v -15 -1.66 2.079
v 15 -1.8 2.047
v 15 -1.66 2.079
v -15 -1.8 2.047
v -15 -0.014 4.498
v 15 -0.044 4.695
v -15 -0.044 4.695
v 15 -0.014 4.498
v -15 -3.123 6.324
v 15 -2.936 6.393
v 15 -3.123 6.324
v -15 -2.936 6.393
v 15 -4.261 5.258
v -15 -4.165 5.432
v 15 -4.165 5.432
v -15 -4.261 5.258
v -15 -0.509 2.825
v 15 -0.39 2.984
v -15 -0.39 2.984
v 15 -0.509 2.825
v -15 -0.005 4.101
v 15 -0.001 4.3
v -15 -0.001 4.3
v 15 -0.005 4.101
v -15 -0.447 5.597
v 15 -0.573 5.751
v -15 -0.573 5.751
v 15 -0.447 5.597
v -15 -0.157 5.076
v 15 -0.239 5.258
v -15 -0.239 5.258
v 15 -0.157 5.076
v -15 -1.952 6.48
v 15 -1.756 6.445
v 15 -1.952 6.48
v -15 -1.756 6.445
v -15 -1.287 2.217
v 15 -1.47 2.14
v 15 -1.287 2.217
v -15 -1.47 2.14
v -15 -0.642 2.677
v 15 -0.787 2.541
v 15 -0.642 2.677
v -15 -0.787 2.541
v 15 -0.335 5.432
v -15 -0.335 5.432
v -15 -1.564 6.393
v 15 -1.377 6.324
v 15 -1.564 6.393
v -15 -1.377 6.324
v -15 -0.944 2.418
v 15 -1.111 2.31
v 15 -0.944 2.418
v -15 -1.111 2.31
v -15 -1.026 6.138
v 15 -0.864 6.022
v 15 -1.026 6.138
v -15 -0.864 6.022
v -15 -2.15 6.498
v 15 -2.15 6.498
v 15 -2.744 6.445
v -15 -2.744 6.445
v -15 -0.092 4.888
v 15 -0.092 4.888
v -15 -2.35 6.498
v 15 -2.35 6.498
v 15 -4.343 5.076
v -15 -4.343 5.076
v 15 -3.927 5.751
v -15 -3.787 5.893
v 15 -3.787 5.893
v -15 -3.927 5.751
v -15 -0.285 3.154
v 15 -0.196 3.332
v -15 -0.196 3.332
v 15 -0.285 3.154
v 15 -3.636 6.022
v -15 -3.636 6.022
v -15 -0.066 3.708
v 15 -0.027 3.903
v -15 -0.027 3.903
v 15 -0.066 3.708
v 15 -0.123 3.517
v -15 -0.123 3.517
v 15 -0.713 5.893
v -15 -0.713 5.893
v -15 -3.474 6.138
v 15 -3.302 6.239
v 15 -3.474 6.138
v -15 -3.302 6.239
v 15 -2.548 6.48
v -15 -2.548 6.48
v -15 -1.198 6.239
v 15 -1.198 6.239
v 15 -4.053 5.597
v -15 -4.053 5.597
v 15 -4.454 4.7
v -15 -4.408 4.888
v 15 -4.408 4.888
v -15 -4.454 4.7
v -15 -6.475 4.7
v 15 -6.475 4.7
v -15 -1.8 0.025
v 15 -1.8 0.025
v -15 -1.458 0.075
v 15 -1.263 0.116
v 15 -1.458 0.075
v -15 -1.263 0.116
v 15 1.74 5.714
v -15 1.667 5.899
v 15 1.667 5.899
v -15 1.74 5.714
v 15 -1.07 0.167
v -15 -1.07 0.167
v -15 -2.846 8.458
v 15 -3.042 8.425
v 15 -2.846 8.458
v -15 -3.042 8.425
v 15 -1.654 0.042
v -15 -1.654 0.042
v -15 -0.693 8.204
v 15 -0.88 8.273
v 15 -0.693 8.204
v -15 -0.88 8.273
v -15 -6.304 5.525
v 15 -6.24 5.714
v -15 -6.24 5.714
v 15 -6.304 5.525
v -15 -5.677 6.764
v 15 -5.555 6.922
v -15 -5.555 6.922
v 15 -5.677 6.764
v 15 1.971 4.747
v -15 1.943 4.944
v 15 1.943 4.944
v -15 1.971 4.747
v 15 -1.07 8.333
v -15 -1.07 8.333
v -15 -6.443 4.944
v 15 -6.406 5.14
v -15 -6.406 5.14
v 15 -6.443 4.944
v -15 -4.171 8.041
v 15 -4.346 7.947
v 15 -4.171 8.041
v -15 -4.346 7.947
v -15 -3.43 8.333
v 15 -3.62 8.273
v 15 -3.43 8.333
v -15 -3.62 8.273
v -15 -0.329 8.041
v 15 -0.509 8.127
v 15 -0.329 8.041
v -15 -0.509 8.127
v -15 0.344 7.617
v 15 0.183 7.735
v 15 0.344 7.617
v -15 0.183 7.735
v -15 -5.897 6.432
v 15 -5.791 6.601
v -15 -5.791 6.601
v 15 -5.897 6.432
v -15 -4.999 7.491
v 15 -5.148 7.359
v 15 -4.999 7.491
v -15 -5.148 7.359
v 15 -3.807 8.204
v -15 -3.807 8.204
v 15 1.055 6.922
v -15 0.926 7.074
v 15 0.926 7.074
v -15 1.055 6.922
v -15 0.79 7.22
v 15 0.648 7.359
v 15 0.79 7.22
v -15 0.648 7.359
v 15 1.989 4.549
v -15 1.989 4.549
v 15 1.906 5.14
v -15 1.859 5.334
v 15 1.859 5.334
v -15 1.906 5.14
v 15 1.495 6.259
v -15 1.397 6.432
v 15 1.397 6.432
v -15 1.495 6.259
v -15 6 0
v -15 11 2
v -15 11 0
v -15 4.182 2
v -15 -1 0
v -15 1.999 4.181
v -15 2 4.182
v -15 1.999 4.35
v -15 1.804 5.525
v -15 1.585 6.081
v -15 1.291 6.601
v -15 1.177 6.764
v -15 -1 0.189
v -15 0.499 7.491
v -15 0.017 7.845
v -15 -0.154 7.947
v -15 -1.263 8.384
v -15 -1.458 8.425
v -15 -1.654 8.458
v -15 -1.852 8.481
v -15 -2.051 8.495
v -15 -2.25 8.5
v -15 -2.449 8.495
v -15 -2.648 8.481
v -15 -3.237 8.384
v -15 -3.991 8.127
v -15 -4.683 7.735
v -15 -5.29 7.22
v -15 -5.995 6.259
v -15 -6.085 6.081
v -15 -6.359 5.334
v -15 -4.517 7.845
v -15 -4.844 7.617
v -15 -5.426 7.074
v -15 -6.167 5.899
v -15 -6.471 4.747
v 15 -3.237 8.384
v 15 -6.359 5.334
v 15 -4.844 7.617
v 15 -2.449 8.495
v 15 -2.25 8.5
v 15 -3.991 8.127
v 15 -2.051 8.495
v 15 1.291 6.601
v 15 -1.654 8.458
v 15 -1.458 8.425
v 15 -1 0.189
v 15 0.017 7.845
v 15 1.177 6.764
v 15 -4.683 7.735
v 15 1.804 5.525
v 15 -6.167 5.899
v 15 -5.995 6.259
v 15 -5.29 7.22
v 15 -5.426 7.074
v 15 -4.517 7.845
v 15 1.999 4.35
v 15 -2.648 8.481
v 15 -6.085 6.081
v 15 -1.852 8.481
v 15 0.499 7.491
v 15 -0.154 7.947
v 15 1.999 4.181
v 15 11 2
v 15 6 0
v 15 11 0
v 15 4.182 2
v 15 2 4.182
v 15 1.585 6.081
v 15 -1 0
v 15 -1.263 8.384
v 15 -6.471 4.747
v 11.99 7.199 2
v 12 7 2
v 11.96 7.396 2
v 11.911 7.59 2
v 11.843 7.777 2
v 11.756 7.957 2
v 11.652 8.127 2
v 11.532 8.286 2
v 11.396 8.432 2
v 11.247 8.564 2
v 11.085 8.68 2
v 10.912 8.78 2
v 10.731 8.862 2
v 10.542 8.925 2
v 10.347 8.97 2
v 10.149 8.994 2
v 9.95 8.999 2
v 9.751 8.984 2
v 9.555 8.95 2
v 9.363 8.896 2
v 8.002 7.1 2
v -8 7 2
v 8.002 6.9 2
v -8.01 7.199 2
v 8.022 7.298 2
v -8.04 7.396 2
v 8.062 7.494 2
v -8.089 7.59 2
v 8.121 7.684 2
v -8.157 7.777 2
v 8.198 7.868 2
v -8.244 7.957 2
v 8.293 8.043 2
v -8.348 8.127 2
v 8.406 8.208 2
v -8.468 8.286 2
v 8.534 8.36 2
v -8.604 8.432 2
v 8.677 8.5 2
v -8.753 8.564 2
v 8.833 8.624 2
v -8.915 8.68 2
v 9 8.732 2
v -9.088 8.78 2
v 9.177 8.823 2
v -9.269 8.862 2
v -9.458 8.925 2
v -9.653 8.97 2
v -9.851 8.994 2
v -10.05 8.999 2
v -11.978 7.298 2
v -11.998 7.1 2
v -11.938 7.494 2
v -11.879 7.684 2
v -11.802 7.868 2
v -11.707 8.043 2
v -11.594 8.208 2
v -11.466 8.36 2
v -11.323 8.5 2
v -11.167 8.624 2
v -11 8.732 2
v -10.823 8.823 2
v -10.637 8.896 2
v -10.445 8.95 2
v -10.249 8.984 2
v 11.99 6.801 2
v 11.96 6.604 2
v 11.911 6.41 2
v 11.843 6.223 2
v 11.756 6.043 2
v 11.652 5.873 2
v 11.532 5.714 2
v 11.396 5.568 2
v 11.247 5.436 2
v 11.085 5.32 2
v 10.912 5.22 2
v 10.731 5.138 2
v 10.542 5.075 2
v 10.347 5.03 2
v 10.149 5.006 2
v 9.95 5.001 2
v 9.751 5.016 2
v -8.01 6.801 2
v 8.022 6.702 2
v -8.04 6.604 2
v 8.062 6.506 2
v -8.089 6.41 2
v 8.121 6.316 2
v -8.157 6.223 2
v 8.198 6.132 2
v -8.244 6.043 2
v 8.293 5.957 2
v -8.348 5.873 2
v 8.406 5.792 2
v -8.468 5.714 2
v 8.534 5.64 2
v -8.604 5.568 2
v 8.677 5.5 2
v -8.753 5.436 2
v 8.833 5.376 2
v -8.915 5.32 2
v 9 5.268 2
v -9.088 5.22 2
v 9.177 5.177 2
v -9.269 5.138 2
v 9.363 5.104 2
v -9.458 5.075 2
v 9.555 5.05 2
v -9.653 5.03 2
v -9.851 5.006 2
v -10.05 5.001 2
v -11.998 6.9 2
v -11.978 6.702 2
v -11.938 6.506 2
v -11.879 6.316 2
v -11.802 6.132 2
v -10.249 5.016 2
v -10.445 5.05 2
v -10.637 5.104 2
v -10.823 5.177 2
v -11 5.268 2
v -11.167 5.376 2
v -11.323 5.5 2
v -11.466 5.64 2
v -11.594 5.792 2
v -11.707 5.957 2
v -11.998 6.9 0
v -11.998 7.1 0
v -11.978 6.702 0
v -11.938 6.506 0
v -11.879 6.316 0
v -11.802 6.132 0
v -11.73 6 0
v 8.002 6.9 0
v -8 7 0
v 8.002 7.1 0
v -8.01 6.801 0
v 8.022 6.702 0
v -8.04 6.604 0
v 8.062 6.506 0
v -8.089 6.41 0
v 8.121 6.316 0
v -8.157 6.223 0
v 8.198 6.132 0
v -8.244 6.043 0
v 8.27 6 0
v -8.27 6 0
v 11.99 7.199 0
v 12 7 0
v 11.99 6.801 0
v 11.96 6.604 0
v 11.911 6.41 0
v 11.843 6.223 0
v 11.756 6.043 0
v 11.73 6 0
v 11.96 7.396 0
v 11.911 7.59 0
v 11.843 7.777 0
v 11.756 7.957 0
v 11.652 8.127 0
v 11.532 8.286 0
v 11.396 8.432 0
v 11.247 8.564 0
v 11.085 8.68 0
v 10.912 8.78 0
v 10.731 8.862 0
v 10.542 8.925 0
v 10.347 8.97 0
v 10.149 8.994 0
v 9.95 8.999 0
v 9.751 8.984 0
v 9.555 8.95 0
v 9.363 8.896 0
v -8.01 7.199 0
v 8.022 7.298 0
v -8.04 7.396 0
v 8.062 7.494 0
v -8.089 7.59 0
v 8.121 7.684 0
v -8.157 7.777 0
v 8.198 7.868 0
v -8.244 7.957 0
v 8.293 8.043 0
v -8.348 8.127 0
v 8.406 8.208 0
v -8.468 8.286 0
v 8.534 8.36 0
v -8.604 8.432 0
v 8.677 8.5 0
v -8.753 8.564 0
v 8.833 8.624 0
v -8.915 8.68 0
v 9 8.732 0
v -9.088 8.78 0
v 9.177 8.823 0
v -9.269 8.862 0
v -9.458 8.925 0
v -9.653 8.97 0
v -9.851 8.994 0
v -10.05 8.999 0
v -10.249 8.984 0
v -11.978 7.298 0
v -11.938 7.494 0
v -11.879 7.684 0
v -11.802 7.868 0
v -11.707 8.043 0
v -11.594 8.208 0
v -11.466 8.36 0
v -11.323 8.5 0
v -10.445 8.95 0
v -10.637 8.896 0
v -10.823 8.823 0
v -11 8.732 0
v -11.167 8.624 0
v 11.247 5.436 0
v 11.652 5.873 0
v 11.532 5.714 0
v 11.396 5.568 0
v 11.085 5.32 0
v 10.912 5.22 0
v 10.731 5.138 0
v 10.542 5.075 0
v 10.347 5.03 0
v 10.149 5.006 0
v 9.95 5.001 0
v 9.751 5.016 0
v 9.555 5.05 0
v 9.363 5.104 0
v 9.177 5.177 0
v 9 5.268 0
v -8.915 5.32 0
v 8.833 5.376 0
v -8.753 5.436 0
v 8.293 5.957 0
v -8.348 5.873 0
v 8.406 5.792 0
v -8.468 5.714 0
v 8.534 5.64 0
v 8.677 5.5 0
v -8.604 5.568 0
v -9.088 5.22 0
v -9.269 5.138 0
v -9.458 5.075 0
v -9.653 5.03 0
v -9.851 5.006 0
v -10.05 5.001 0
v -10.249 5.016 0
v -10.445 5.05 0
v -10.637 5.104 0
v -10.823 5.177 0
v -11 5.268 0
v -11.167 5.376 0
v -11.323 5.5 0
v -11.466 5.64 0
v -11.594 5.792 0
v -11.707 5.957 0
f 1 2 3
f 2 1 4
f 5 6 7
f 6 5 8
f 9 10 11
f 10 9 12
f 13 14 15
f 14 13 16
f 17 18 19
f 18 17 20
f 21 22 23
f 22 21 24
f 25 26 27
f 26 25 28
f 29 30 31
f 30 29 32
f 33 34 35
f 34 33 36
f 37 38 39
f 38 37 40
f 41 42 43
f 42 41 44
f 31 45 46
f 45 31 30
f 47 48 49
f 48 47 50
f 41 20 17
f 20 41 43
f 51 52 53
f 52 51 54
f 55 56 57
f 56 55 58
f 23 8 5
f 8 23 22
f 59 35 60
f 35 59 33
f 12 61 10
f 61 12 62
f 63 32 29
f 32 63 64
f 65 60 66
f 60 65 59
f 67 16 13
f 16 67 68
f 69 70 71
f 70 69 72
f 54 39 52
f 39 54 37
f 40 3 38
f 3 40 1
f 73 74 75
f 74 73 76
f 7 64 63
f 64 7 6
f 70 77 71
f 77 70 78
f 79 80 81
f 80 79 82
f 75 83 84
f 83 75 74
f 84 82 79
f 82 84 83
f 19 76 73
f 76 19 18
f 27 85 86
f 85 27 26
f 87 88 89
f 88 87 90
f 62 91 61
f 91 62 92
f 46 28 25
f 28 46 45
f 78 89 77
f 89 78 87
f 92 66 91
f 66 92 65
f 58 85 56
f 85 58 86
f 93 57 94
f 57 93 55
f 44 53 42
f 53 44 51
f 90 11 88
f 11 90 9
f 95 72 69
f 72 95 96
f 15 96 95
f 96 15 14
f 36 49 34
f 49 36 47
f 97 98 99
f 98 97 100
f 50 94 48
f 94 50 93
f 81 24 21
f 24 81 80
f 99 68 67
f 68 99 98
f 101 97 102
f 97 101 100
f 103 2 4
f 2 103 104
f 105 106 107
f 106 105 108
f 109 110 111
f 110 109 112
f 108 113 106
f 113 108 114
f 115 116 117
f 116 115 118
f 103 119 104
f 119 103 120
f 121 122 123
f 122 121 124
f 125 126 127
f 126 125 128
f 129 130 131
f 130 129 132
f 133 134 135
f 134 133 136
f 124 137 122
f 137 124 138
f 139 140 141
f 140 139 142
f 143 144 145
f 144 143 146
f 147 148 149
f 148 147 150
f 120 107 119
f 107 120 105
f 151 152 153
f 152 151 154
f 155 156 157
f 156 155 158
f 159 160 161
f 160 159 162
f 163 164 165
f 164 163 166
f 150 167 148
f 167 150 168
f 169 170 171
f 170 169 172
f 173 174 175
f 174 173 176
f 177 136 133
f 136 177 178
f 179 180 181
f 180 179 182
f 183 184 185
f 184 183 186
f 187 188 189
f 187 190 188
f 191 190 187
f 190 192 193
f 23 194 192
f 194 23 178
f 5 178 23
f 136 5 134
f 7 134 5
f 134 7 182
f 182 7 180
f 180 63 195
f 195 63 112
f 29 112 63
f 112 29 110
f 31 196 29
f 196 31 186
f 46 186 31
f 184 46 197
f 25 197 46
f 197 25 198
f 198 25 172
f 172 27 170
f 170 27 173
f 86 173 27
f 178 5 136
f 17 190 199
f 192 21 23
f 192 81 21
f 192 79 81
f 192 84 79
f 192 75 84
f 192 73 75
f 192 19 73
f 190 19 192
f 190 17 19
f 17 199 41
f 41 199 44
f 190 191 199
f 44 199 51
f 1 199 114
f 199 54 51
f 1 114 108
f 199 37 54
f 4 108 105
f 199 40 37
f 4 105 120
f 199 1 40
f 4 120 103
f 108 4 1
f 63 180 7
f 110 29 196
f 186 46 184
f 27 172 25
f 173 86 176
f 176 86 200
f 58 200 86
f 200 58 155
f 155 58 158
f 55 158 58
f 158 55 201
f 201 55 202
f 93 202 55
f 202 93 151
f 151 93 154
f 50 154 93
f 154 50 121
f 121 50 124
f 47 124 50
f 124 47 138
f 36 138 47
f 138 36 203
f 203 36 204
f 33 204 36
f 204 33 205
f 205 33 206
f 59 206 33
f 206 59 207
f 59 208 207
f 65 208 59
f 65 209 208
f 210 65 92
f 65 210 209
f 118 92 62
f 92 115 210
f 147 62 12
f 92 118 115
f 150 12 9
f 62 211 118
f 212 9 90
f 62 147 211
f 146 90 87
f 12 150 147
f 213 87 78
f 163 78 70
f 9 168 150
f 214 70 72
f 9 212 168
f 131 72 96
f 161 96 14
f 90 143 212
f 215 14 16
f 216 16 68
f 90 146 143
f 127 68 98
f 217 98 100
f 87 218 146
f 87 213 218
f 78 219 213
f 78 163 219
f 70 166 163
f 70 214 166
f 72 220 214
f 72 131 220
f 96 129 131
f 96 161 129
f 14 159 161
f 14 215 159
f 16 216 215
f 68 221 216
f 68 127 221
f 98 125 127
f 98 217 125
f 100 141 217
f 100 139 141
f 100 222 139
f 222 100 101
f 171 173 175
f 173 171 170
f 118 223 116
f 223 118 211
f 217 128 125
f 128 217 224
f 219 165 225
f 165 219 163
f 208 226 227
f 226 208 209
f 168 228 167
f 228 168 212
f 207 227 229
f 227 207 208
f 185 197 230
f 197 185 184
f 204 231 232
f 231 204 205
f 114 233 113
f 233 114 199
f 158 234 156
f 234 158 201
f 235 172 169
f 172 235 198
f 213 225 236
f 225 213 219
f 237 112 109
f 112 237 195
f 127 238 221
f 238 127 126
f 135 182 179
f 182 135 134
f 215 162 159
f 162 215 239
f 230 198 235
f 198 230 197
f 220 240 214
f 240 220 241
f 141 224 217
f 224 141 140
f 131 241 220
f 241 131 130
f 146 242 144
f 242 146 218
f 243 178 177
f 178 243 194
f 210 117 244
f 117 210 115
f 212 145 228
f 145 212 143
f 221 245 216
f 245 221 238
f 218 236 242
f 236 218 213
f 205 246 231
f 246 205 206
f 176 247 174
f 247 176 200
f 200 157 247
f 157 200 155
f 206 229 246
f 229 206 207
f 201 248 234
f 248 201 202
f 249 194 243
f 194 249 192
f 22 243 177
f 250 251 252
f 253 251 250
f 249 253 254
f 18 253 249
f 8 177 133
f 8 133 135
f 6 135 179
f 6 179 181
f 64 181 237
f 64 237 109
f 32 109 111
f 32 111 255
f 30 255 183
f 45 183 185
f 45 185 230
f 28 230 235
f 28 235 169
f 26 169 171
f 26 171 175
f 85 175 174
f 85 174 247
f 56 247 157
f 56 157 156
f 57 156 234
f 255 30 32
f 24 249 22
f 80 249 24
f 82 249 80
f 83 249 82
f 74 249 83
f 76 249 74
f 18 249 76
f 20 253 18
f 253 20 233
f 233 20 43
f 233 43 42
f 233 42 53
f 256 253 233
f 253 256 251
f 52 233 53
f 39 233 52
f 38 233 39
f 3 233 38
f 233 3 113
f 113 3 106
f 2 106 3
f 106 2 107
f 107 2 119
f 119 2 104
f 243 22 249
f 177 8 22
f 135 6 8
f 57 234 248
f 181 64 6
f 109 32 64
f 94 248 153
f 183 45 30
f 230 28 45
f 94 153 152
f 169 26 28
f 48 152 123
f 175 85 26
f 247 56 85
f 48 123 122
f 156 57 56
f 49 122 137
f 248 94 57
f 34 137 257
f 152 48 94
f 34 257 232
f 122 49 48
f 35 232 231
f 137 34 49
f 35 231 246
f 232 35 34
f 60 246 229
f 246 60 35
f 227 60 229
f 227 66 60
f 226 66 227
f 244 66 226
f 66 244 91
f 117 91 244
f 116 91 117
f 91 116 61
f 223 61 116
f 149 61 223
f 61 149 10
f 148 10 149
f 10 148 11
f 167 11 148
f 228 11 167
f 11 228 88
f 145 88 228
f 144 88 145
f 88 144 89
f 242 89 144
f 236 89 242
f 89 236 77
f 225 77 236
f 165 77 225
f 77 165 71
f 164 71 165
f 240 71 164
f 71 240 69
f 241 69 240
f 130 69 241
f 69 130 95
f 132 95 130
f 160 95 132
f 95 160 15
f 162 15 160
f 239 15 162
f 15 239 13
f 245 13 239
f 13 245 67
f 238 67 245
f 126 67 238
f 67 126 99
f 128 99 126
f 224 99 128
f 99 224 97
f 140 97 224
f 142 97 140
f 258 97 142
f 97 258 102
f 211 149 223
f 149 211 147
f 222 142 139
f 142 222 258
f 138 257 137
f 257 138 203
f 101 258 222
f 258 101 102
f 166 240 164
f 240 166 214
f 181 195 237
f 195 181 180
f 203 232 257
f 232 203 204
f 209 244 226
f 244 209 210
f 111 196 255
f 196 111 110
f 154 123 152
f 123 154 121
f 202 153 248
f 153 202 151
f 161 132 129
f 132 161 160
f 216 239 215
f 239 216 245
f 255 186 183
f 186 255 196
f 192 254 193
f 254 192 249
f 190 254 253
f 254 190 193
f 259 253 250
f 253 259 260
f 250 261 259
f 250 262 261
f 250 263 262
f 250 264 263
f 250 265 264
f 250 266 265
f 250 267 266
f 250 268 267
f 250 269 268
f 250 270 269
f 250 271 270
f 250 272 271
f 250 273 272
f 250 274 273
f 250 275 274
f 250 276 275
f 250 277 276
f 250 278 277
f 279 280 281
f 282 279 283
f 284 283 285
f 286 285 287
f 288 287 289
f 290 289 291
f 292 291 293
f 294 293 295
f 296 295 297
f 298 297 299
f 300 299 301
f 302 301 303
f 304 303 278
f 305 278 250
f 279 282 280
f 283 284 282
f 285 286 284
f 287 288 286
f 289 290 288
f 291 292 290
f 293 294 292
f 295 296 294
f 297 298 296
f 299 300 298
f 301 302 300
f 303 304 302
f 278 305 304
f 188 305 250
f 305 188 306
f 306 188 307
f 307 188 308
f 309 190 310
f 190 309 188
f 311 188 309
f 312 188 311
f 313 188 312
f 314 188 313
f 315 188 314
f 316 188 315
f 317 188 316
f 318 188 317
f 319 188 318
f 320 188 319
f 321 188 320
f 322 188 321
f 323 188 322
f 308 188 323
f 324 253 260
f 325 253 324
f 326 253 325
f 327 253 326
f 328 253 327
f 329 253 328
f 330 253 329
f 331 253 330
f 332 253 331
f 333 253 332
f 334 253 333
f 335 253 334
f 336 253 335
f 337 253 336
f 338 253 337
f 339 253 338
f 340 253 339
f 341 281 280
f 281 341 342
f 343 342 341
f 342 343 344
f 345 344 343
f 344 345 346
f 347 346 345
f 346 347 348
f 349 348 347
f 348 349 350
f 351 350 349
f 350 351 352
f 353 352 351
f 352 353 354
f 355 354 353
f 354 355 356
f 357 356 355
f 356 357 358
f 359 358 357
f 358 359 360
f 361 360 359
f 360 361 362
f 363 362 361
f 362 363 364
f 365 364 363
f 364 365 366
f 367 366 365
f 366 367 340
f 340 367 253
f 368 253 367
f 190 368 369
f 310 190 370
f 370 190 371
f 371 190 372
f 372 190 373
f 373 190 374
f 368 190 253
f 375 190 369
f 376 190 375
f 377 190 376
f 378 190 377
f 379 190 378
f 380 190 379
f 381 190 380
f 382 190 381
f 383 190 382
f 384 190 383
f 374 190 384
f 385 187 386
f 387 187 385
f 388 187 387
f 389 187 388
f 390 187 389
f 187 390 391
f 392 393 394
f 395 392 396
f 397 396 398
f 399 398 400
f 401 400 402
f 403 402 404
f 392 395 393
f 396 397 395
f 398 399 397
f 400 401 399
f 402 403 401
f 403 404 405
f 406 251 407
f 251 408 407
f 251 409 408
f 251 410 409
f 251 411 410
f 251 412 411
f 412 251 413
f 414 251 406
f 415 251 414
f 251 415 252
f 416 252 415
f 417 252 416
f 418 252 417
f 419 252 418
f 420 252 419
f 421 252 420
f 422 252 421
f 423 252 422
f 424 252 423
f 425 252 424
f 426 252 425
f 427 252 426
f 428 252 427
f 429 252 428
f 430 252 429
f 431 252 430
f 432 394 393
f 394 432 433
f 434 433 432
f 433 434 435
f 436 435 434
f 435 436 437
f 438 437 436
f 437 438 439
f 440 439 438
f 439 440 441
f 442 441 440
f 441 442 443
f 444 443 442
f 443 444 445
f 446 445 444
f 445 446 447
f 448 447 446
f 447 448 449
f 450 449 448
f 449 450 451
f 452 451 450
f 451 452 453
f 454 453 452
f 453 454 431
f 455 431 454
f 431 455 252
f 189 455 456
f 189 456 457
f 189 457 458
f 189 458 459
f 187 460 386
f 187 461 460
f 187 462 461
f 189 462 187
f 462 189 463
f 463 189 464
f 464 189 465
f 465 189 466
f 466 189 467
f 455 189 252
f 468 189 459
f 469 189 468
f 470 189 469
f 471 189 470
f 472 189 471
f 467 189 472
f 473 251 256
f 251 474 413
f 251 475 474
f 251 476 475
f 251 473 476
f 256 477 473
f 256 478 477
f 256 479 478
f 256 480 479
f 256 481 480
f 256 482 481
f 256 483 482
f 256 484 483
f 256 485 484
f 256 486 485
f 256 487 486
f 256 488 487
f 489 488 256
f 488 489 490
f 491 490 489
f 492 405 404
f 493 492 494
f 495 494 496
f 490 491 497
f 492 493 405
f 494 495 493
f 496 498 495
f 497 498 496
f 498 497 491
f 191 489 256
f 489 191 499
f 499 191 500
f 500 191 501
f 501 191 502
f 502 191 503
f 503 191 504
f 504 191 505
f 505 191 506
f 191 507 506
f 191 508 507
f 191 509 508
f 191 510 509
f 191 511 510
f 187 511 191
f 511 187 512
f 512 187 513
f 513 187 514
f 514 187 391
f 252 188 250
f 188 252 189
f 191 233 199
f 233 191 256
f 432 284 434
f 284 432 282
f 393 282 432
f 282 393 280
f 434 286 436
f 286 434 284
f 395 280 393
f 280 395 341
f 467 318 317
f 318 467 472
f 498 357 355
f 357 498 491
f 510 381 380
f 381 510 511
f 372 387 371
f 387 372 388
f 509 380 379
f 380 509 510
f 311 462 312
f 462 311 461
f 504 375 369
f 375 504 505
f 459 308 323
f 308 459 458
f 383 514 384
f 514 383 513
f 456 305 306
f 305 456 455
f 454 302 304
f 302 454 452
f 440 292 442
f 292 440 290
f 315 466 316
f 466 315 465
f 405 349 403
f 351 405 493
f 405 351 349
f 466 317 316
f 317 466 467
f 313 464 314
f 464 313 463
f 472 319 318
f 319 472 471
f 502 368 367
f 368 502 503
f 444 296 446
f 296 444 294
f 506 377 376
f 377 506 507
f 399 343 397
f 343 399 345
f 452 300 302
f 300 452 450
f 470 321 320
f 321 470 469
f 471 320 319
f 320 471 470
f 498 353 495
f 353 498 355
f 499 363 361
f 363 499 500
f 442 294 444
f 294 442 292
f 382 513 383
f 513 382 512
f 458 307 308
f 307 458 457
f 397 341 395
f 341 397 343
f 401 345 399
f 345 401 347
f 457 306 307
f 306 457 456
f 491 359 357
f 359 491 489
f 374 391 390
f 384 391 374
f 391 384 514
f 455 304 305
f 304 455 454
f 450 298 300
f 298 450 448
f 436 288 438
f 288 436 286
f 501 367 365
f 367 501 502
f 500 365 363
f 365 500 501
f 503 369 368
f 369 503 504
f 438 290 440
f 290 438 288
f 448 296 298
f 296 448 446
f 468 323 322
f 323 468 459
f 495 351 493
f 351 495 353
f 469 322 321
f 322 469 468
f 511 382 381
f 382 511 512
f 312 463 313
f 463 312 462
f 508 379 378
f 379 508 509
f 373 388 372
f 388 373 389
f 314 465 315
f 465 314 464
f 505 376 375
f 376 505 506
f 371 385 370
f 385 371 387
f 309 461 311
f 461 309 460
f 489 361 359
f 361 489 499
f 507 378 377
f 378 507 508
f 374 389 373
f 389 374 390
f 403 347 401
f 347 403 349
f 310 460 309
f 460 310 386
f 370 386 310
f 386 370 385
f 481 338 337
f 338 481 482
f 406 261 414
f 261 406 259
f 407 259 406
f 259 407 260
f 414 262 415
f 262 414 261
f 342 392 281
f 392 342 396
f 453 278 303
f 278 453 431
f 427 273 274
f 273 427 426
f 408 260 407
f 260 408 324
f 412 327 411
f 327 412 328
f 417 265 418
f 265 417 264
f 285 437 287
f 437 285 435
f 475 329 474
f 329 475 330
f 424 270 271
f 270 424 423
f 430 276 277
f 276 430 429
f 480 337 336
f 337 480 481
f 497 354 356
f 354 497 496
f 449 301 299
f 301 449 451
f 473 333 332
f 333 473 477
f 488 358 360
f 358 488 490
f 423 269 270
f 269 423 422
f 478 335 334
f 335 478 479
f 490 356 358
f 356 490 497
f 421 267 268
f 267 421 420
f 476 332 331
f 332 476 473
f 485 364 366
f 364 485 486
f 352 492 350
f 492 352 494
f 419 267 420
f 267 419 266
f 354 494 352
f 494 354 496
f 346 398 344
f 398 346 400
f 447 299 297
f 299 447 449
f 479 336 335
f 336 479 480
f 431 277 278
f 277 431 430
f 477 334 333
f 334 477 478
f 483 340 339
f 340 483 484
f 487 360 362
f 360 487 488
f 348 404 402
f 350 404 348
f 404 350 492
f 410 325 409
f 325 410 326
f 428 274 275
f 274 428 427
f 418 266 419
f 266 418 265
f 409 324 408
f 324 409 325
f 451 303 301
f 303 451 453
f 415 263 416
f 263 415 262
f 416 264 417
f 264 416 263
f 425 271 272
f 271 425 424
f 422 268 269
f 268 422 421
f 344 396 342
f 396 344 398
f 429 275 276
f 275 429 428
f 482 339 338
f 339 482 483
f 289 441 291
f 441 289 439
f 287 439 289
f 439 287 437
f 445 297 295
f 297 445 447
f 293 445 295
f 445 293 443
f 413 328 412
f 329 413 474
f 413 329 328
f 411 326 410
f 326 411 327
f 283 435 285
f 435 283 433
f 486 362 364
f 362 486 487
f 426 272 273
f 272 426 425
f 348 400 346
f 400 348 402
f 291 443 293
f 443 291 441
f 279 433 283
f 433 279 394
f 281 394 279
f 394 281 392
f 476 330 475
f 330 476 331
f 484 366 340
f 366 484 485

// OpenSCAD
diameter = 4.5;
width = 30;
thickness = 2;
height = 12;
hole = 4;
space = 3;
$fa = 1;
$fs = .2;


module holes() {
	translate([- width / 2 + space + hole / 2, height / 2 - space - hole / 2, 0]) cylinder(d = hole, h = thickness * 2, center = true);
	translate([width / 2 - space - hole / 2, height / 2 - space - hole / 2, 0]) cylinder(d = hole, h = thickness * 2, center = true);

}

module stand() {
	translate([0, height / 2, thickness / 2]) difference() {
		union() {
			translate([0, thickness - height / 2, 0]) rotate([45, 0, 0]) cube([width, diameter, diameter], center = true);
			translate([0, - thickness / 2, 0]) cube([width, height, thickness], center = true);
		}
		holes();
	}
}

module holder() {
	translate([- width / 2, 0, 0]) {
		translate([0, - diameter / 2, diameter/2 + thickness ]) rotate([0, 90, 0])
			difference() {
				cylinder(d = diameter + 2 * thickness, h = width);
				translate([0, 0, - .5]) {
					cylinder(d = diameter, h = width + 1);
					translate([- .1 * diameter, - 2 * diameter, 0]) cube([2 * diameter, 2.1 * diameter, width + 1]);
				}
			}
	}
}

difference() {
	union() {
		holder();
		stand();
	}
	translate([0, 0, - 3 / 2 * thickness]) cube([width + 2 * (hole + 2 * space), height, 3 * thickness], center = true);
}
